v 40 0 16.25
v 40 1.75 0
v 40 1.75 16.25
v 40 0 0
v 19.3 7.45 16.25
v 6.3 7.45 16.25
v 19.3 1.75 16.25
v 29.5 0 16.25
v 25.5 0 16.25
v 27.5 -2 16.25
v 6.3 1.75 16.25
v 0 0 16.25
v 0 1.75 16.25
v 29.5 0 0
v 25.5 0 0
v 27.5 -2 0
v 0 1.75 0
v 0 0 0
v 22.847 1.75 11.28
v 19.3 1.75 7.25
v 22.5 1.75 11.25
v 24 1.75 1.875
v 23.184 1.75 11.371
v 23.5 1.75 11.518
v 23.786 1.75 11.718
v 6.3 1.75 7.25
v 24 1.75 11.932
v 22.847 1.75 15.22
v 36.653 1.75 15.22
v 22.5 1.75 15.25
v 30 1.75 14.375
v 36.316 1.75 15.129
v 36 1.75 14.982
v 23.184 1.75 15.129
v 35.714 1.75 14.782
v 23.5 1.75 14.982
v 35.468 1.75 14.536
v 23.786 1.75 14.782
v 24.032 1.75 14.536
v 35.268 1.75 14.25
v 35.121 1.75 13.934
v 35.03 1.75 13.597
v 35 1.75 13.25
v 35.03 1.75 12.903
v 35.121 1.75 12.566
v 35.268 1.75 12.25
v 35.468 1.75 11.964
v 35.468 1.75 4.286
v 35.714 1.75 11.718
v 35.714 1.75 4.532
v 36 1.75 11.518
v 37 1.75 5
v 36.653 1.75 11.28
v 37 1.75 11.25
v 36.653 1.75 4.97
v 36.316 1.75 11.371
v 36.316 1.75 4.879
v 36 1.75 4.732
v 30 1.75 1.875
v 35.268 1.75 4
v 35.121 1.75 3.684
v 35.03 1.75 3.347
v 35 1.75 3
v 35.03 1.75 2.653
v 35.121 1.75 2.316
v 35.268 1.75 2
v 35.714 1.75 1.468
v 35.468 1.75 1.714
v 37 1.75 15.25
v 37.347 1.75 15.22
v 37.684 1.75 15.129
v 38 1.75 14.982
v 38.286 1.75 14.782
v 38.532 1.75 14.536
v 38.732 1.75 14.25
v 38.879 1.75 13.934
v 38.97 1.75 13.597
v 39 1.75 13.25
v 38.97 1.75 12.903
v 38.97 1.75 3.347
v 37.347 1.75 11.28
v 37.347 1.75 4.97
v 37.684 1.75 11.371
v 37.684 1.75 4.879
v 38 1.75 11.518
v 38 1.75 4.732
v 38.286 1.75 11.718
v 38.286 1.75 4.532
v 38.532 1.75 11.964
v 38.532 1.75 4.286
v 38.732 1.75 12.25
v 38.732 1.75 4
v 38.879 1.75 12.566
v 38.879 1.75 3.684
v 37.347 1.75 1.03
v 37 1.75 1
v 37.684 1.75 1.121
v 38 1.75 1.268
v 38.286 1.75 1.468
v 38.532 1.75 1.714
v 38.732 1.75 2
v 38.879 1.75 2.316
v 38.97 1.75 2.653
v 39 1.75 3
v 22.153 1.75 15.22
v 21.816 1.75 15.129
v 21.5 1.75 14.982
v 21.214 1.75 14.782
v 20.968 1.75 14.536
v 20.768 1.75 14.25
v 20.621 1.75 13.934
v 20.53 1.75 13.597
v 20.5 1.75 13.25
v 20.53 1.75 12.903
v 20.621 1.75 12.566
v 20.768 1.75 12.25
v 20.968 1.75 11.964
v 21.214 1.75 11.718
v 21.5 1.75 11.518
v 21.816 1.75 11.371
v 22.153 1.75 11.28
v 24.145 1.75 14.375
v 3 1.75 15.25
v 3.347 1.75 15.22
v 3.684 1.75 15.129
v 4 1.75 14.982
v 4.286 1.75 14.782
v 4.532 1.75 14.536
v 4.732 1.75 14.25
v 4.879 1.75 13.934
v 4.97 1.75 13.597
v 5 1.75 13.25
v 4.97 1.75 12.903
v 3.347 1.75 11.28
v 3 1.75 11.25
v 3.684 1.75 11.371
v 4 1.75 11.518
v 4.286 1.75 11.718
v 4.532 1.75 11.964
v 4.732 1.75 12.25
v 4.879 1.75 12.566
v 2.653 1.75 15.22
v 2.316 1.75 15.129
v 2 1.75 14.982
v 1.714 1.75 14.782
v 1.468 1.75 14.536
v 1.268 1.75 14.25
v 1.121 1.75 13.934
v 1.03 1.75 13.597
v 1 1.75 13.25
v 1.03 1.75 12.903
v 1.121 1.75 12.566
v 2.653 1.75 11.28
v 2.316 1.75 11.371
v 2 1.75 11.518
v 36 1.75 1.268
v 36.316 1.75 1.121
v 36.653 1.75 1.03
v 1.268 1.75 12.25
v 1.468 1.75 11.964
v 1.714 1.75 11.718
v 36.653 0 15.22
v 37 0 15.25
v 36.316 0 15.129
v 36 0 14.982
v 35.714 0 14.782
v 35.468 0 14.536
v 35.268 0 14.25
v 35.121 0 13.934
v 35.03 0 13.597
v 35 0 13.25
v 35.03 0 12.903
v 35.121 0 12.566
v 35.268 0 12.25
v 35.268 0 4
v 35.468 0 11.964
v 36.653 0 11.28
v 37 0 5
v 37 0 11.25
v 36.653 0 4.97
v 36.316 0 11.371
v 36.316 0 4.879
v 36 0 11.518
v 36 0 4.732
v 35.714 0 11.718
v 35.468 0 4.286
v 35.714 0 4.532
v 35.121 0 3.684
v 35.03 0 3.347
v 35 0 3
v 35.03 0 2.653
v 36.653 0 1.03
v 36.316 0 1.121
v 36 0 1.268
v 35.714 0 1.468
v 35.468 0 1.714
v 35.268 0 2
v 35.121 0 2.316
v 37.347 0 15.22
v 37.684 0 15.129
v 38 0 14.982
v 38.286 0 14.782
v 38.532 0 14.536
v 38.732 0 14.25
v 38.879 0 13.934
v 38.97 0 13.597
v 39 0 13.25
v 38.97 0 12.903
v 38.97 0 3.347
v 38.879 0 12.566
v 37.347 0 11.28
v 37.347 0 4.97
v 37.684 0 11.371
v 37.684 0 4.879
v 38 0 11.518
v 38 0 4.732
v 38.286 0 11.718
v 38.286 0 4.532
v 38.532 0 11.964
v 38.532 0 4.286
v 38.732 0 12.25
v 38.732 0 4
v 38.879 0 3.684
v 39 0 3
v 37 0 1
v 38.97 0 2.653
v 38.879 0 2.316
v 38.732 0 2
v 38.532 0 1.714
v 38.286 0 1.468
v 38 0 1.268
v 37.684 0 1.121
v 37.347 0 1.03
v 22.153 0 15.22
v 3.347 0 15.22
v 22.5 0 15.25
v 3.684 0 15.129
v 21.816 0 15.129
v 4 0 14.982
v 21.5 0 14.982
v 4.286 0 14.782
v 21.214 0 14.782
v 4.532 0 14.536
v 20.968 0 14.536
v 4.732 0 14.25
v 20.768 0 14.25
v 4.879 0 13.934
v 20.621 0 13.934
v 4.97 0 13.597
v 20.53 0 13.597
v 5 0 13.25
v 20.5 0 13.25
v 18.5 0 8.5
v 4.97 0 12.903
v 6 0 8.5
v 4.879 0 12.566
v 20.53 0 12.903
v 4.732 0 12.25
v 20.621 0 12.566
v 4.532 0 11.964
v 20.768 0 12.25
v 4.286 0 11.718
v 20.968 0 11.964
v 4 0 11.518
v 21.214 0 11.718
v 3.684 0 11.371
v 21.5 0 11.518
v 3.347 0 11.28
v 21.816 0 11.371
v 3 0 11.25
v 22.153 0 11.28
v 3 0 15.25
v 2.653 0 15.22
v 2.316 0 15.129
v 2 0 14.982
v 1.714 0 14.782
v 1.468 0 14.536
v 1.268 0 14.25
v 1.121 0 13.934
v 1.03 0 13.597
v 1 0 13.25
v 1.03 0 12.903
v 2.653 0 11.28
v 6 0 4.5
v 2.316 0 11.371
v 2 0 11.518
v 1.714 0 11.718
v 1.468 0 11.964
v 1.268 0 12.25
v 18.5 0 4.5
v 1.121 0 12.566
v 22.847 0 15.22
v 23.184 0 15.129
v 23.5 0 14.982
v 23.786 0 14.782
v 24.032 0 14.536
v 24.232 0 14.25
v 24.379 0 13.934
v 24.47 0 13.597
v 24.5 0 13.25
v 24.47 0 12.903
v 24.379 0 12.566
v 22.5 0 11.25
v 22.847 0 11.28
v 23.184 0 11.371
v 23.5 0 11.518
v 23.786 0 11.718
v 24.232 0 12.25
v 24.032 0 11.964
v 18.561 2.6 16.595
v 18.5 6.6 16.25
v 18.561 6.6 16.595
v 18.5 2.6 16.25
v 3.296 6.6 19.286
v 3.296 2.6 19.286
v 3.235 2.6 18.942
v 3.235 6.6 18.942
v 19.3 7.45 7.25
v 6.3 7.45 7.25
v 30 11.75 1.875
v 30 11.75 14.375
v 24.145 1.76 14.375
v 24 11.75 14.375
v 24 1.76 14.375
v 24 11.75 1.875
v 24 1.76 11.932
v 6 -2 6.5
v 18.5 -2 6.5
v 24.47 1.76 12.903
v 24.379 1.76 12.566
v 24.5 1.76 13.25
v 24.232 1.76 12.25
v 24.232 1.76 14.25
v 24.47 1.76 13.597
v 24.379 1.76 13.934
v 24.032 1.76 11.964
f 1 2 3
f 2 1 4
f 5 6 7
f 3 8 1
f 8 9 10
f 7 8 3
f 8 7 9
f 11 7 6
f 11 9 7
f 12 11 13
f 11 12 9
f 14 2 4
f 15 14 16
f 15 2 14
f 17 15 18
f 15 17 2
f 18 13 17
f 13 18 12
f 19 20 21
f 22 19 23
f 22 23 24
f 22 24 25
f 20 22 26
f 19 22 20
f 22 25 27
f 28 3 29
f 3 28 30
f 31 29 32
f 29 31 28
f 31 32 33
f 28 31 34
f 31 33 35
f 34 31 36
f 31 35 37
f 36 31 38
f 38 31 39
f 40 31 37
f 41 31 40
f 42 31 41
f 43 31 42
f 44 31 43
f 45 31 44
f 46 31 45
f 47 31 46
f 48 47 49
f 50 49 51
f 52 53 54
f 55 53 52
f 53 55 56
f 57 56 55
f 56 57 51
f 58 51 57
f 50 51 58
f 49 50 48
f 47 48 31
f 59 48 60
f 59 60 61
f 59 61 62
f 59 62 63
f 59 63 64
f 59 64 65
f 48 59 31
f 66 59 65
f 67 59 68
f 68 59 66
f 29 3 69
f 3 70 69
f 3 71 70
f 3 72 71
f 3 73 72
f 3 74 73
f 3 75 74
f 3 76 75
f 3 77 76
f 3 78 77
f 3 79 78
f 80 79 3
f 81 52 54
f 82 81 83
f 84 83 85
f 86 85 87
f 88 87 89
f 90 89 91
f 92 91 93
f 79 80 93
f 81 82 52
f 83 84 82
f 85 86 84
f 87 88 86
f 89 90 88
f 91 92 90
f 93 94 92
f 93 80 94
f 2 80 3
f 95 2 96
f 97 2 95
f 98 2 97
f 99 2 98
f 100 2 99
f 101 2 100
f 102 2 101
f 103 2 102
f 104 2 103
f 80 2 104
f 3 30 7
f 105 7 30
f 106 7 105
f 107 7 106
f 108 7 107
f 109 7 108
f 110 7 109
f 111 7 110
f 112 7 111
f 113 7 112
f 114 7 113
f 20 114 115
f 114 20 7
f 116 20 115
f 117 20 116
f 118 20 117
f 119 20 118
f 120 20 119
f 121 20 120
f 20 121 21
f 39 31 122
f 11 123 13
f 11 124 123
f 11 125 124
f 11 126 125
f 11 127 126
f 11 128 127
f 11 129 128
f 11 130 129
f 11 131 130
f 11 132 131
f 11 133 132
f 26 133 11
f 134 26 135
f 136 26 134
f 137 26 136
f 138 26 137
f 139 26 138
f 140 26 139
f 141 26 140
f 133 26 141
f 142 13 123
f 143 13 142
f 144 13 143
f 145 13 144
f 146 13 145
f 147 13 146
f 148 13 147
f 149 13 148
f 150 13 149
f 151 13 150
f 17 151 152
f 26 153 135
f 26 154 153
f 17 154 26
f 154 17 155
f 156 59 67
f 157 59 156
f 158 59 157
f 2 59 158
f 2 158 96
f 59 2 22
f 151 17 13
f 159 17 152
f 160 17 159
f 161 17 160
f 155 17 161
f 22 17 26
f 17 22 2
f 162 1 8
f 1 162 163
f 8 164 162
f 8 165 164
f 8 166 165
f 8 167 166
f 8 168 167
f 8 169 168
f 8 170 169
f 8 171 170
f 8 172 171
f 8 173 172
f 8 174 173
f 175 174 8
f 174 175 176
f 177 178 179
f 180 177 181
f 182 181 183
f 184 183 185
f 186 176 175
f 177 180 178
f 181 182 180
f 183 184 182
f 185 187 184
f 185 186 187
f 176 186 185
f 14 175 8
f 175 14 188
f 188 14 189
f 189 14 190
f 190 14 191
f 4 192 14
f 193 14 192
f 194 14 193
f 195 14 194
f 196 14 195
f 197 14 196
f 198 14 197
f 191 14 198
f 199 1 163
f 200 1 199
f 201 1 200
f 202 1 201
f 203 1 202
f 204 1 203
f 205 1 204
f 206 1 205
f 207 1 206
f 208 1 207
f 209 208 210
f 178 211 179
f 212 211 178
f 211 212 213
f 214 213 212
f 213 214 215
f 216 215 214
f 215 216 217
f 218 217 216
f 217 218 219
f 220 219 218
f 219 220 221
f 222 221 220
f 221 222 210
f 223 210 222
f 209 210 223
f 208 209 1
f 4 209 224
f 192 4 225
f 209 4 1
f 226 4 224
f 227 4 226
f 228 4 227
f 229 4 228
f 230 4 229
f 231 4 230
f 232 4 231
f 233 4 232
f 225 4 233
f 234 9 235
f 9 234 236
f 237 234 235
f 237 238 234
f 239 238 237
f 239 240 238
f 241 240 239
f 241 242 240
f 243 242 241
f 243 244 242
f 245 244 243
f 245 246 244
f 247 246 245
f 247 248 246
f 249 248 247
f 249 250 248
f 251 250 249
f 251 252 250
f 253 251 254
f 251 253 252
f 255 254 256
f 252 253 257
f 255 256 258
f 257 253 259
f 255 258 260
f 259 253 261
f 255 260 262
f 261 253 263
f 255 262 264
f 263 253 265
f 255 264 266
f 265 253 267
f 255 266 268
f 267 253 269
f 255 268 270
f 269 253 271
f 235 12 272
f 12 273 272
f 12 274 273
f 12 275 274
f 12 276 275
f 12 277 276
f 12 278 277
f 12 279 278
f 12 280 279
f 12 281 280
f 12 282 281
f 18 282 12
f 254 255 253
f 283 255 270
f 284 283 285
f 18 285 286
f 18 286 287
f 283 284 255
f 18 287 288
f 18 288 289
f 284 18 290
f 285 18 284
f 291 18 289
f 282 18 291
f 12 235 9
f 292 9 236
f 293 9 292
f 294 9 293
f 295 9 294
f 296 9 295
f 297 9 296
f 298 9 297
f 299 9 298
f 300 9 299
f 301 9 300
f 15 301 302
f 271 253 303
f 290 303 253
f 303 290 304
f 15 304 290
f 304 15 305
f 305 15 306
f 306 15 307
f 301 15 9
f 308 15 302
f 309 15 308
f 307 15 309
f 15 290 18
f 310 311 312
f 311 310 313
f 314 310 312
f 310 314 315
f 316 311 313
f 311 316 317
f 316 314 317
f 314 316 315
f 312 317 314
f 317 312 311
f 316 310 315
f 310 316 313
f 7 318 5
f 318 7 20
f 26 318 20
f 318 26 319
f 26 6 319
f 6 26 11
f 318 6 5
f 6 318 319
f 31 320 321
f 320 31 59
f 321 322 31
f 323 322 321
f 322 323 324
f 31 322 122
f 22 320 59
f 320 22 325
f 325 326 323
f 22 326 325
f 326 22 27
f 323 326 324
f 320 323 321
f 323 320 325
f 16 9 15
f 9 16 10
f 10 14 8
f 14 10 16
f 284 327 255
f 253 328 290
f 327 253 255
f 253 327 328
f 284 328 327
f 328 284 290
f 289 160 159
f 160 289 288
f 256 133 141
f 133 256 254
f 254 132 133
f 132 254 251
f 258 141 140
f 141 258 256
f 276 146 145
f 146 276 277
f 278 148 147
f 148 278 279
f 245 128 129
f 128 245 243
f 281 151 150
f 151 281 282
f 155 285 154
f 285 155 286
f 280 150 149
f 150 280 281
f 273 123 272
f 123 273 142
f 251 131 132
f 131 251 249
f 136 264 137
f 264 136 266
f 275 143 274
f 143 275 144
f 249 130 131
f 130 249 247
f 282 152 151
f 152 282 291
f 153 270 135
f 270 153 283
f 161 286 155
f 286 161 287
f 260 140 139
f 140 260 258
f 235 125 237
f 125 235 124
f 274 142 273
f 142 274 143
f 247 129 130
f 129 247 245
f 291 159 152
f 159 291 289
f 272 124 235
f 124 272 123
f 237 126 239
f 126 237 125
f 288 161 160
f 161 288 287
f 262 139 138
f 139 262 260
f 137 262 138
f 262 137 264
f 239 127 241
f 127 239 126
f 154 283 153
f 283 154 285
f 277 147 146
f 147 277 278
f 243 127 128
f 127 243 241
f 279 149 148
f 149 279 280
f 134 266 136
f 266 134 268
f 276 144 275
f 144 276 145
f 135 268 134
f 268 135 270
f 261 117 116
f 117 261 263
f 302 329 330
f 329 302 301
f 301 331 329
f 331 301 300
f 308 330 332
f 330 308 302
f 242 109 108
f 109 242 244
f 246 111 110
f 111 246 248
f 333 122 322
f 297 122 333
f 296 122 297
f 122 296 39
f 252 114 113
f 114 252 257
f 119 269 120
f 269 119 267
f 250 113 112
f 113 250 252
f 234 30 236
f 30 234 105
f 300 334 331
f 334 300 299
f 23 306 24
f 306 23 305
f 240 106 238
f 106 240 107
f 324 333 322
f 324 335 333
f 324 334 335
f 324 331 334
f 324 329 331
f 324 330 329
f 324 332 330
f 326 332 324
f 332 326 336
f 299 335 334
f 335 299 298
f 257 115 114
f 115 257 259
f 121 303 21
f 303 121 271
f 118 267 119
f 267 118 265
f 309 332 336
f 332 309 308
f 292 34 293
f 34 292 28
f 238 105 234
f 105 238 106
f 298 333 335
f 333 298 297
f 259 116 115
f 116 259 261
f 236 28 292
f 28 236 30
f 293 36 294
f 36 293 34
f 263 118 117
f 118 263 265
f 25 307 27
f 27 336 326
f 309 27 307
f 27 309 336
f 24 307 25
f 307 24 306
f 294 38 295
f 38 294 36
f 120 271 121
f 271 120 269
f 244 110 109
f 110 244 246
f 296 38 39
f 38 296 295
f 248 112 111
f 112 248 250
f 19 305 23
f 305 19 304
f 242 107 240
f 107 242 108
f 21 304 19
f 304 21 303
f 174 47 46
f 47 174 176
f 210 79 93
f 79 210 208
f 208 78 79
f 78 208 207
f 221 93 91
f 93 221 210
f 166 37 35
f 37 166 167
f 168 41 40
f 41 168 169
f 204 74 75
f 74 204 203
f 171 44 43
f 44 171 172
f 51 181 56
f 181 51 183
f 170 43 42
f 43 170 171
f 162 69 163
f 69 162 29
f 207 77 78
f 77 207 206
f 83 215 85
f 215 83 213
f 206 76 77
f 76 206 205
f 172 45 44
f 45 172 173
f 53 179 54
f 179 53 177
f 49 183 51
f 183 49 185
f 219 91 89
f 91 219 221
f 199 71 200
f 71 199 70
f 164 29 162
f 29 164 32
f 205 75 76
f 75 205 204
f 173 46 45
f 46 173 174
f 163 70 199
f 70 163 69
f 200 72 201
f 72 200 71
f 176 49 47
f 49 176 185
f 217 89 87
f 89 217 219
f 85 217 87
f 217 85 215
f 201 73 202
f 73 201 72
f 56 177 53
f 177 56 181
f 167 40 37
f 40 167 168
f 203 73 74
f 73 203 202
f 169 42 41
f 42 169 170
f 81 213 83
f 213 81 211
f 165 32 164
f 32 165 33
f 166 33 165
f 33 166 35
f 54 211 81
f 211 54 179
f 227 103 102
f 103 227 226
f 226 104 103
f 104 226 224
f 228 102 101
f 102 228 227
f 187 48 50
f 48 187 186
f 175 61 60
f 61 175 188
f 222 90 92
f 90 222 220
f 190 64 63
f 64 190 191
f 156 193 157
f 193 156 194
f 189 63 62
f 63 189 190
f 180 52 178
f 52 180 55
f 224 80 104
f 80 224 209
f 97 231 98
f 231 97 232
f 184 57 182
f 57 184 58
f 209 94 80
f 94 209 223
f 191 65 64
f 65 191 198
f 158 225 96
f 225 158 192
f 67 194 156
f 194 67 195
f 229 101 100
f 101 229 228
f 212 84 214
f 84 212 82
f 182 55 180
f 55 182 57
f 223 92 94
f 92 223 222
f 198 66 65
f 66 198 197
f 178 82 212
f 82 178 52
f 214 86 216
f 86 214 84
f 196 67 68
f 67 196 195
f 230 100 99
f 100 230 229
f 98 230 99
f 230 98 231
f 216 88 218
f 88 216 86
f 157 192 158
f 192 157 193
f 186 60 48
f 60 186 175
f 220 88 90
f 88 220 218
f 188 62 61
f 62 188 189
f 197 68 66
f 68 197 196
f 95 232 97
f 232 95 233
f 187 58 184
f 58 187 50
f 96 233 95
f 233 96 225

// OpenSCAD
// file: primitives.scad
module triangular_prism_rect(b, h, l, c = false) {
  linear_extrude(height = l, center = c, convexity = 10, twist = 0)
  polygon(points=[[0,0],[b,0],[0,h]], paths=[[0,1,2]]);
}

module triangular_prism(b, h, l, c = false) {
  linear_extrude(height = l, center = c, convexity = 10, twist = 0)
  polygon(points=[[-b/2,0],[b/2,0],[0,h]], paths=[[0,1,2]]);
}
translate([0,15,0]) triangular_prism(4,2,40);
// main file
use <primitives.scad>

module stop_switch() {
difference() {
  union() {
    cube([40,1.75,16.25]);
    color("silver") translate([18.5,1.75+5.70/2-2,16.25]) rotate([0,10,0]) translate([-15.5,0,0]) cube([15.5,4,0.35]);
    color("white") translate([6.3,1.75,16.25-9]) cube([13,5.70,4.5]);
    color("grey") translate([6.3,1.75,16.25-4.5]) cube([13,5.70,4.5]);
    color("white") translate([26-2,1.75,16.25/2-6.25]) cube([6,10,12.5]);
    color("Grey") rotate([0,0,180]) 
       translate([-27.5,0,0]) triangular_prism(4,2,16.25);
    color("Grey") translate([6,0,6.5]) rotate([0,-90,180]) triangular_prism(4,2,12.5);

  }
  translate([3,-0.01,16.25-3]) rotate([-90,0,0]) cylinder(h=1.77,r=2,$fn=36);
  translate([22.5,-0.01,16.25-3]) rotate([-90,0,0]) cylinder(h=1.77,r=2,$fn=36);
  translate([40-3,-0.01,16.25-3]) rotate([-90,0,0]) cylinder(h=1.77,r=2,$fn=36);
  translate([40-3,-0.01,3]) rotate([-90,0,0]) cylinder(h=1.77,r=2,$fn=36
);

}
}

stop_switch();
